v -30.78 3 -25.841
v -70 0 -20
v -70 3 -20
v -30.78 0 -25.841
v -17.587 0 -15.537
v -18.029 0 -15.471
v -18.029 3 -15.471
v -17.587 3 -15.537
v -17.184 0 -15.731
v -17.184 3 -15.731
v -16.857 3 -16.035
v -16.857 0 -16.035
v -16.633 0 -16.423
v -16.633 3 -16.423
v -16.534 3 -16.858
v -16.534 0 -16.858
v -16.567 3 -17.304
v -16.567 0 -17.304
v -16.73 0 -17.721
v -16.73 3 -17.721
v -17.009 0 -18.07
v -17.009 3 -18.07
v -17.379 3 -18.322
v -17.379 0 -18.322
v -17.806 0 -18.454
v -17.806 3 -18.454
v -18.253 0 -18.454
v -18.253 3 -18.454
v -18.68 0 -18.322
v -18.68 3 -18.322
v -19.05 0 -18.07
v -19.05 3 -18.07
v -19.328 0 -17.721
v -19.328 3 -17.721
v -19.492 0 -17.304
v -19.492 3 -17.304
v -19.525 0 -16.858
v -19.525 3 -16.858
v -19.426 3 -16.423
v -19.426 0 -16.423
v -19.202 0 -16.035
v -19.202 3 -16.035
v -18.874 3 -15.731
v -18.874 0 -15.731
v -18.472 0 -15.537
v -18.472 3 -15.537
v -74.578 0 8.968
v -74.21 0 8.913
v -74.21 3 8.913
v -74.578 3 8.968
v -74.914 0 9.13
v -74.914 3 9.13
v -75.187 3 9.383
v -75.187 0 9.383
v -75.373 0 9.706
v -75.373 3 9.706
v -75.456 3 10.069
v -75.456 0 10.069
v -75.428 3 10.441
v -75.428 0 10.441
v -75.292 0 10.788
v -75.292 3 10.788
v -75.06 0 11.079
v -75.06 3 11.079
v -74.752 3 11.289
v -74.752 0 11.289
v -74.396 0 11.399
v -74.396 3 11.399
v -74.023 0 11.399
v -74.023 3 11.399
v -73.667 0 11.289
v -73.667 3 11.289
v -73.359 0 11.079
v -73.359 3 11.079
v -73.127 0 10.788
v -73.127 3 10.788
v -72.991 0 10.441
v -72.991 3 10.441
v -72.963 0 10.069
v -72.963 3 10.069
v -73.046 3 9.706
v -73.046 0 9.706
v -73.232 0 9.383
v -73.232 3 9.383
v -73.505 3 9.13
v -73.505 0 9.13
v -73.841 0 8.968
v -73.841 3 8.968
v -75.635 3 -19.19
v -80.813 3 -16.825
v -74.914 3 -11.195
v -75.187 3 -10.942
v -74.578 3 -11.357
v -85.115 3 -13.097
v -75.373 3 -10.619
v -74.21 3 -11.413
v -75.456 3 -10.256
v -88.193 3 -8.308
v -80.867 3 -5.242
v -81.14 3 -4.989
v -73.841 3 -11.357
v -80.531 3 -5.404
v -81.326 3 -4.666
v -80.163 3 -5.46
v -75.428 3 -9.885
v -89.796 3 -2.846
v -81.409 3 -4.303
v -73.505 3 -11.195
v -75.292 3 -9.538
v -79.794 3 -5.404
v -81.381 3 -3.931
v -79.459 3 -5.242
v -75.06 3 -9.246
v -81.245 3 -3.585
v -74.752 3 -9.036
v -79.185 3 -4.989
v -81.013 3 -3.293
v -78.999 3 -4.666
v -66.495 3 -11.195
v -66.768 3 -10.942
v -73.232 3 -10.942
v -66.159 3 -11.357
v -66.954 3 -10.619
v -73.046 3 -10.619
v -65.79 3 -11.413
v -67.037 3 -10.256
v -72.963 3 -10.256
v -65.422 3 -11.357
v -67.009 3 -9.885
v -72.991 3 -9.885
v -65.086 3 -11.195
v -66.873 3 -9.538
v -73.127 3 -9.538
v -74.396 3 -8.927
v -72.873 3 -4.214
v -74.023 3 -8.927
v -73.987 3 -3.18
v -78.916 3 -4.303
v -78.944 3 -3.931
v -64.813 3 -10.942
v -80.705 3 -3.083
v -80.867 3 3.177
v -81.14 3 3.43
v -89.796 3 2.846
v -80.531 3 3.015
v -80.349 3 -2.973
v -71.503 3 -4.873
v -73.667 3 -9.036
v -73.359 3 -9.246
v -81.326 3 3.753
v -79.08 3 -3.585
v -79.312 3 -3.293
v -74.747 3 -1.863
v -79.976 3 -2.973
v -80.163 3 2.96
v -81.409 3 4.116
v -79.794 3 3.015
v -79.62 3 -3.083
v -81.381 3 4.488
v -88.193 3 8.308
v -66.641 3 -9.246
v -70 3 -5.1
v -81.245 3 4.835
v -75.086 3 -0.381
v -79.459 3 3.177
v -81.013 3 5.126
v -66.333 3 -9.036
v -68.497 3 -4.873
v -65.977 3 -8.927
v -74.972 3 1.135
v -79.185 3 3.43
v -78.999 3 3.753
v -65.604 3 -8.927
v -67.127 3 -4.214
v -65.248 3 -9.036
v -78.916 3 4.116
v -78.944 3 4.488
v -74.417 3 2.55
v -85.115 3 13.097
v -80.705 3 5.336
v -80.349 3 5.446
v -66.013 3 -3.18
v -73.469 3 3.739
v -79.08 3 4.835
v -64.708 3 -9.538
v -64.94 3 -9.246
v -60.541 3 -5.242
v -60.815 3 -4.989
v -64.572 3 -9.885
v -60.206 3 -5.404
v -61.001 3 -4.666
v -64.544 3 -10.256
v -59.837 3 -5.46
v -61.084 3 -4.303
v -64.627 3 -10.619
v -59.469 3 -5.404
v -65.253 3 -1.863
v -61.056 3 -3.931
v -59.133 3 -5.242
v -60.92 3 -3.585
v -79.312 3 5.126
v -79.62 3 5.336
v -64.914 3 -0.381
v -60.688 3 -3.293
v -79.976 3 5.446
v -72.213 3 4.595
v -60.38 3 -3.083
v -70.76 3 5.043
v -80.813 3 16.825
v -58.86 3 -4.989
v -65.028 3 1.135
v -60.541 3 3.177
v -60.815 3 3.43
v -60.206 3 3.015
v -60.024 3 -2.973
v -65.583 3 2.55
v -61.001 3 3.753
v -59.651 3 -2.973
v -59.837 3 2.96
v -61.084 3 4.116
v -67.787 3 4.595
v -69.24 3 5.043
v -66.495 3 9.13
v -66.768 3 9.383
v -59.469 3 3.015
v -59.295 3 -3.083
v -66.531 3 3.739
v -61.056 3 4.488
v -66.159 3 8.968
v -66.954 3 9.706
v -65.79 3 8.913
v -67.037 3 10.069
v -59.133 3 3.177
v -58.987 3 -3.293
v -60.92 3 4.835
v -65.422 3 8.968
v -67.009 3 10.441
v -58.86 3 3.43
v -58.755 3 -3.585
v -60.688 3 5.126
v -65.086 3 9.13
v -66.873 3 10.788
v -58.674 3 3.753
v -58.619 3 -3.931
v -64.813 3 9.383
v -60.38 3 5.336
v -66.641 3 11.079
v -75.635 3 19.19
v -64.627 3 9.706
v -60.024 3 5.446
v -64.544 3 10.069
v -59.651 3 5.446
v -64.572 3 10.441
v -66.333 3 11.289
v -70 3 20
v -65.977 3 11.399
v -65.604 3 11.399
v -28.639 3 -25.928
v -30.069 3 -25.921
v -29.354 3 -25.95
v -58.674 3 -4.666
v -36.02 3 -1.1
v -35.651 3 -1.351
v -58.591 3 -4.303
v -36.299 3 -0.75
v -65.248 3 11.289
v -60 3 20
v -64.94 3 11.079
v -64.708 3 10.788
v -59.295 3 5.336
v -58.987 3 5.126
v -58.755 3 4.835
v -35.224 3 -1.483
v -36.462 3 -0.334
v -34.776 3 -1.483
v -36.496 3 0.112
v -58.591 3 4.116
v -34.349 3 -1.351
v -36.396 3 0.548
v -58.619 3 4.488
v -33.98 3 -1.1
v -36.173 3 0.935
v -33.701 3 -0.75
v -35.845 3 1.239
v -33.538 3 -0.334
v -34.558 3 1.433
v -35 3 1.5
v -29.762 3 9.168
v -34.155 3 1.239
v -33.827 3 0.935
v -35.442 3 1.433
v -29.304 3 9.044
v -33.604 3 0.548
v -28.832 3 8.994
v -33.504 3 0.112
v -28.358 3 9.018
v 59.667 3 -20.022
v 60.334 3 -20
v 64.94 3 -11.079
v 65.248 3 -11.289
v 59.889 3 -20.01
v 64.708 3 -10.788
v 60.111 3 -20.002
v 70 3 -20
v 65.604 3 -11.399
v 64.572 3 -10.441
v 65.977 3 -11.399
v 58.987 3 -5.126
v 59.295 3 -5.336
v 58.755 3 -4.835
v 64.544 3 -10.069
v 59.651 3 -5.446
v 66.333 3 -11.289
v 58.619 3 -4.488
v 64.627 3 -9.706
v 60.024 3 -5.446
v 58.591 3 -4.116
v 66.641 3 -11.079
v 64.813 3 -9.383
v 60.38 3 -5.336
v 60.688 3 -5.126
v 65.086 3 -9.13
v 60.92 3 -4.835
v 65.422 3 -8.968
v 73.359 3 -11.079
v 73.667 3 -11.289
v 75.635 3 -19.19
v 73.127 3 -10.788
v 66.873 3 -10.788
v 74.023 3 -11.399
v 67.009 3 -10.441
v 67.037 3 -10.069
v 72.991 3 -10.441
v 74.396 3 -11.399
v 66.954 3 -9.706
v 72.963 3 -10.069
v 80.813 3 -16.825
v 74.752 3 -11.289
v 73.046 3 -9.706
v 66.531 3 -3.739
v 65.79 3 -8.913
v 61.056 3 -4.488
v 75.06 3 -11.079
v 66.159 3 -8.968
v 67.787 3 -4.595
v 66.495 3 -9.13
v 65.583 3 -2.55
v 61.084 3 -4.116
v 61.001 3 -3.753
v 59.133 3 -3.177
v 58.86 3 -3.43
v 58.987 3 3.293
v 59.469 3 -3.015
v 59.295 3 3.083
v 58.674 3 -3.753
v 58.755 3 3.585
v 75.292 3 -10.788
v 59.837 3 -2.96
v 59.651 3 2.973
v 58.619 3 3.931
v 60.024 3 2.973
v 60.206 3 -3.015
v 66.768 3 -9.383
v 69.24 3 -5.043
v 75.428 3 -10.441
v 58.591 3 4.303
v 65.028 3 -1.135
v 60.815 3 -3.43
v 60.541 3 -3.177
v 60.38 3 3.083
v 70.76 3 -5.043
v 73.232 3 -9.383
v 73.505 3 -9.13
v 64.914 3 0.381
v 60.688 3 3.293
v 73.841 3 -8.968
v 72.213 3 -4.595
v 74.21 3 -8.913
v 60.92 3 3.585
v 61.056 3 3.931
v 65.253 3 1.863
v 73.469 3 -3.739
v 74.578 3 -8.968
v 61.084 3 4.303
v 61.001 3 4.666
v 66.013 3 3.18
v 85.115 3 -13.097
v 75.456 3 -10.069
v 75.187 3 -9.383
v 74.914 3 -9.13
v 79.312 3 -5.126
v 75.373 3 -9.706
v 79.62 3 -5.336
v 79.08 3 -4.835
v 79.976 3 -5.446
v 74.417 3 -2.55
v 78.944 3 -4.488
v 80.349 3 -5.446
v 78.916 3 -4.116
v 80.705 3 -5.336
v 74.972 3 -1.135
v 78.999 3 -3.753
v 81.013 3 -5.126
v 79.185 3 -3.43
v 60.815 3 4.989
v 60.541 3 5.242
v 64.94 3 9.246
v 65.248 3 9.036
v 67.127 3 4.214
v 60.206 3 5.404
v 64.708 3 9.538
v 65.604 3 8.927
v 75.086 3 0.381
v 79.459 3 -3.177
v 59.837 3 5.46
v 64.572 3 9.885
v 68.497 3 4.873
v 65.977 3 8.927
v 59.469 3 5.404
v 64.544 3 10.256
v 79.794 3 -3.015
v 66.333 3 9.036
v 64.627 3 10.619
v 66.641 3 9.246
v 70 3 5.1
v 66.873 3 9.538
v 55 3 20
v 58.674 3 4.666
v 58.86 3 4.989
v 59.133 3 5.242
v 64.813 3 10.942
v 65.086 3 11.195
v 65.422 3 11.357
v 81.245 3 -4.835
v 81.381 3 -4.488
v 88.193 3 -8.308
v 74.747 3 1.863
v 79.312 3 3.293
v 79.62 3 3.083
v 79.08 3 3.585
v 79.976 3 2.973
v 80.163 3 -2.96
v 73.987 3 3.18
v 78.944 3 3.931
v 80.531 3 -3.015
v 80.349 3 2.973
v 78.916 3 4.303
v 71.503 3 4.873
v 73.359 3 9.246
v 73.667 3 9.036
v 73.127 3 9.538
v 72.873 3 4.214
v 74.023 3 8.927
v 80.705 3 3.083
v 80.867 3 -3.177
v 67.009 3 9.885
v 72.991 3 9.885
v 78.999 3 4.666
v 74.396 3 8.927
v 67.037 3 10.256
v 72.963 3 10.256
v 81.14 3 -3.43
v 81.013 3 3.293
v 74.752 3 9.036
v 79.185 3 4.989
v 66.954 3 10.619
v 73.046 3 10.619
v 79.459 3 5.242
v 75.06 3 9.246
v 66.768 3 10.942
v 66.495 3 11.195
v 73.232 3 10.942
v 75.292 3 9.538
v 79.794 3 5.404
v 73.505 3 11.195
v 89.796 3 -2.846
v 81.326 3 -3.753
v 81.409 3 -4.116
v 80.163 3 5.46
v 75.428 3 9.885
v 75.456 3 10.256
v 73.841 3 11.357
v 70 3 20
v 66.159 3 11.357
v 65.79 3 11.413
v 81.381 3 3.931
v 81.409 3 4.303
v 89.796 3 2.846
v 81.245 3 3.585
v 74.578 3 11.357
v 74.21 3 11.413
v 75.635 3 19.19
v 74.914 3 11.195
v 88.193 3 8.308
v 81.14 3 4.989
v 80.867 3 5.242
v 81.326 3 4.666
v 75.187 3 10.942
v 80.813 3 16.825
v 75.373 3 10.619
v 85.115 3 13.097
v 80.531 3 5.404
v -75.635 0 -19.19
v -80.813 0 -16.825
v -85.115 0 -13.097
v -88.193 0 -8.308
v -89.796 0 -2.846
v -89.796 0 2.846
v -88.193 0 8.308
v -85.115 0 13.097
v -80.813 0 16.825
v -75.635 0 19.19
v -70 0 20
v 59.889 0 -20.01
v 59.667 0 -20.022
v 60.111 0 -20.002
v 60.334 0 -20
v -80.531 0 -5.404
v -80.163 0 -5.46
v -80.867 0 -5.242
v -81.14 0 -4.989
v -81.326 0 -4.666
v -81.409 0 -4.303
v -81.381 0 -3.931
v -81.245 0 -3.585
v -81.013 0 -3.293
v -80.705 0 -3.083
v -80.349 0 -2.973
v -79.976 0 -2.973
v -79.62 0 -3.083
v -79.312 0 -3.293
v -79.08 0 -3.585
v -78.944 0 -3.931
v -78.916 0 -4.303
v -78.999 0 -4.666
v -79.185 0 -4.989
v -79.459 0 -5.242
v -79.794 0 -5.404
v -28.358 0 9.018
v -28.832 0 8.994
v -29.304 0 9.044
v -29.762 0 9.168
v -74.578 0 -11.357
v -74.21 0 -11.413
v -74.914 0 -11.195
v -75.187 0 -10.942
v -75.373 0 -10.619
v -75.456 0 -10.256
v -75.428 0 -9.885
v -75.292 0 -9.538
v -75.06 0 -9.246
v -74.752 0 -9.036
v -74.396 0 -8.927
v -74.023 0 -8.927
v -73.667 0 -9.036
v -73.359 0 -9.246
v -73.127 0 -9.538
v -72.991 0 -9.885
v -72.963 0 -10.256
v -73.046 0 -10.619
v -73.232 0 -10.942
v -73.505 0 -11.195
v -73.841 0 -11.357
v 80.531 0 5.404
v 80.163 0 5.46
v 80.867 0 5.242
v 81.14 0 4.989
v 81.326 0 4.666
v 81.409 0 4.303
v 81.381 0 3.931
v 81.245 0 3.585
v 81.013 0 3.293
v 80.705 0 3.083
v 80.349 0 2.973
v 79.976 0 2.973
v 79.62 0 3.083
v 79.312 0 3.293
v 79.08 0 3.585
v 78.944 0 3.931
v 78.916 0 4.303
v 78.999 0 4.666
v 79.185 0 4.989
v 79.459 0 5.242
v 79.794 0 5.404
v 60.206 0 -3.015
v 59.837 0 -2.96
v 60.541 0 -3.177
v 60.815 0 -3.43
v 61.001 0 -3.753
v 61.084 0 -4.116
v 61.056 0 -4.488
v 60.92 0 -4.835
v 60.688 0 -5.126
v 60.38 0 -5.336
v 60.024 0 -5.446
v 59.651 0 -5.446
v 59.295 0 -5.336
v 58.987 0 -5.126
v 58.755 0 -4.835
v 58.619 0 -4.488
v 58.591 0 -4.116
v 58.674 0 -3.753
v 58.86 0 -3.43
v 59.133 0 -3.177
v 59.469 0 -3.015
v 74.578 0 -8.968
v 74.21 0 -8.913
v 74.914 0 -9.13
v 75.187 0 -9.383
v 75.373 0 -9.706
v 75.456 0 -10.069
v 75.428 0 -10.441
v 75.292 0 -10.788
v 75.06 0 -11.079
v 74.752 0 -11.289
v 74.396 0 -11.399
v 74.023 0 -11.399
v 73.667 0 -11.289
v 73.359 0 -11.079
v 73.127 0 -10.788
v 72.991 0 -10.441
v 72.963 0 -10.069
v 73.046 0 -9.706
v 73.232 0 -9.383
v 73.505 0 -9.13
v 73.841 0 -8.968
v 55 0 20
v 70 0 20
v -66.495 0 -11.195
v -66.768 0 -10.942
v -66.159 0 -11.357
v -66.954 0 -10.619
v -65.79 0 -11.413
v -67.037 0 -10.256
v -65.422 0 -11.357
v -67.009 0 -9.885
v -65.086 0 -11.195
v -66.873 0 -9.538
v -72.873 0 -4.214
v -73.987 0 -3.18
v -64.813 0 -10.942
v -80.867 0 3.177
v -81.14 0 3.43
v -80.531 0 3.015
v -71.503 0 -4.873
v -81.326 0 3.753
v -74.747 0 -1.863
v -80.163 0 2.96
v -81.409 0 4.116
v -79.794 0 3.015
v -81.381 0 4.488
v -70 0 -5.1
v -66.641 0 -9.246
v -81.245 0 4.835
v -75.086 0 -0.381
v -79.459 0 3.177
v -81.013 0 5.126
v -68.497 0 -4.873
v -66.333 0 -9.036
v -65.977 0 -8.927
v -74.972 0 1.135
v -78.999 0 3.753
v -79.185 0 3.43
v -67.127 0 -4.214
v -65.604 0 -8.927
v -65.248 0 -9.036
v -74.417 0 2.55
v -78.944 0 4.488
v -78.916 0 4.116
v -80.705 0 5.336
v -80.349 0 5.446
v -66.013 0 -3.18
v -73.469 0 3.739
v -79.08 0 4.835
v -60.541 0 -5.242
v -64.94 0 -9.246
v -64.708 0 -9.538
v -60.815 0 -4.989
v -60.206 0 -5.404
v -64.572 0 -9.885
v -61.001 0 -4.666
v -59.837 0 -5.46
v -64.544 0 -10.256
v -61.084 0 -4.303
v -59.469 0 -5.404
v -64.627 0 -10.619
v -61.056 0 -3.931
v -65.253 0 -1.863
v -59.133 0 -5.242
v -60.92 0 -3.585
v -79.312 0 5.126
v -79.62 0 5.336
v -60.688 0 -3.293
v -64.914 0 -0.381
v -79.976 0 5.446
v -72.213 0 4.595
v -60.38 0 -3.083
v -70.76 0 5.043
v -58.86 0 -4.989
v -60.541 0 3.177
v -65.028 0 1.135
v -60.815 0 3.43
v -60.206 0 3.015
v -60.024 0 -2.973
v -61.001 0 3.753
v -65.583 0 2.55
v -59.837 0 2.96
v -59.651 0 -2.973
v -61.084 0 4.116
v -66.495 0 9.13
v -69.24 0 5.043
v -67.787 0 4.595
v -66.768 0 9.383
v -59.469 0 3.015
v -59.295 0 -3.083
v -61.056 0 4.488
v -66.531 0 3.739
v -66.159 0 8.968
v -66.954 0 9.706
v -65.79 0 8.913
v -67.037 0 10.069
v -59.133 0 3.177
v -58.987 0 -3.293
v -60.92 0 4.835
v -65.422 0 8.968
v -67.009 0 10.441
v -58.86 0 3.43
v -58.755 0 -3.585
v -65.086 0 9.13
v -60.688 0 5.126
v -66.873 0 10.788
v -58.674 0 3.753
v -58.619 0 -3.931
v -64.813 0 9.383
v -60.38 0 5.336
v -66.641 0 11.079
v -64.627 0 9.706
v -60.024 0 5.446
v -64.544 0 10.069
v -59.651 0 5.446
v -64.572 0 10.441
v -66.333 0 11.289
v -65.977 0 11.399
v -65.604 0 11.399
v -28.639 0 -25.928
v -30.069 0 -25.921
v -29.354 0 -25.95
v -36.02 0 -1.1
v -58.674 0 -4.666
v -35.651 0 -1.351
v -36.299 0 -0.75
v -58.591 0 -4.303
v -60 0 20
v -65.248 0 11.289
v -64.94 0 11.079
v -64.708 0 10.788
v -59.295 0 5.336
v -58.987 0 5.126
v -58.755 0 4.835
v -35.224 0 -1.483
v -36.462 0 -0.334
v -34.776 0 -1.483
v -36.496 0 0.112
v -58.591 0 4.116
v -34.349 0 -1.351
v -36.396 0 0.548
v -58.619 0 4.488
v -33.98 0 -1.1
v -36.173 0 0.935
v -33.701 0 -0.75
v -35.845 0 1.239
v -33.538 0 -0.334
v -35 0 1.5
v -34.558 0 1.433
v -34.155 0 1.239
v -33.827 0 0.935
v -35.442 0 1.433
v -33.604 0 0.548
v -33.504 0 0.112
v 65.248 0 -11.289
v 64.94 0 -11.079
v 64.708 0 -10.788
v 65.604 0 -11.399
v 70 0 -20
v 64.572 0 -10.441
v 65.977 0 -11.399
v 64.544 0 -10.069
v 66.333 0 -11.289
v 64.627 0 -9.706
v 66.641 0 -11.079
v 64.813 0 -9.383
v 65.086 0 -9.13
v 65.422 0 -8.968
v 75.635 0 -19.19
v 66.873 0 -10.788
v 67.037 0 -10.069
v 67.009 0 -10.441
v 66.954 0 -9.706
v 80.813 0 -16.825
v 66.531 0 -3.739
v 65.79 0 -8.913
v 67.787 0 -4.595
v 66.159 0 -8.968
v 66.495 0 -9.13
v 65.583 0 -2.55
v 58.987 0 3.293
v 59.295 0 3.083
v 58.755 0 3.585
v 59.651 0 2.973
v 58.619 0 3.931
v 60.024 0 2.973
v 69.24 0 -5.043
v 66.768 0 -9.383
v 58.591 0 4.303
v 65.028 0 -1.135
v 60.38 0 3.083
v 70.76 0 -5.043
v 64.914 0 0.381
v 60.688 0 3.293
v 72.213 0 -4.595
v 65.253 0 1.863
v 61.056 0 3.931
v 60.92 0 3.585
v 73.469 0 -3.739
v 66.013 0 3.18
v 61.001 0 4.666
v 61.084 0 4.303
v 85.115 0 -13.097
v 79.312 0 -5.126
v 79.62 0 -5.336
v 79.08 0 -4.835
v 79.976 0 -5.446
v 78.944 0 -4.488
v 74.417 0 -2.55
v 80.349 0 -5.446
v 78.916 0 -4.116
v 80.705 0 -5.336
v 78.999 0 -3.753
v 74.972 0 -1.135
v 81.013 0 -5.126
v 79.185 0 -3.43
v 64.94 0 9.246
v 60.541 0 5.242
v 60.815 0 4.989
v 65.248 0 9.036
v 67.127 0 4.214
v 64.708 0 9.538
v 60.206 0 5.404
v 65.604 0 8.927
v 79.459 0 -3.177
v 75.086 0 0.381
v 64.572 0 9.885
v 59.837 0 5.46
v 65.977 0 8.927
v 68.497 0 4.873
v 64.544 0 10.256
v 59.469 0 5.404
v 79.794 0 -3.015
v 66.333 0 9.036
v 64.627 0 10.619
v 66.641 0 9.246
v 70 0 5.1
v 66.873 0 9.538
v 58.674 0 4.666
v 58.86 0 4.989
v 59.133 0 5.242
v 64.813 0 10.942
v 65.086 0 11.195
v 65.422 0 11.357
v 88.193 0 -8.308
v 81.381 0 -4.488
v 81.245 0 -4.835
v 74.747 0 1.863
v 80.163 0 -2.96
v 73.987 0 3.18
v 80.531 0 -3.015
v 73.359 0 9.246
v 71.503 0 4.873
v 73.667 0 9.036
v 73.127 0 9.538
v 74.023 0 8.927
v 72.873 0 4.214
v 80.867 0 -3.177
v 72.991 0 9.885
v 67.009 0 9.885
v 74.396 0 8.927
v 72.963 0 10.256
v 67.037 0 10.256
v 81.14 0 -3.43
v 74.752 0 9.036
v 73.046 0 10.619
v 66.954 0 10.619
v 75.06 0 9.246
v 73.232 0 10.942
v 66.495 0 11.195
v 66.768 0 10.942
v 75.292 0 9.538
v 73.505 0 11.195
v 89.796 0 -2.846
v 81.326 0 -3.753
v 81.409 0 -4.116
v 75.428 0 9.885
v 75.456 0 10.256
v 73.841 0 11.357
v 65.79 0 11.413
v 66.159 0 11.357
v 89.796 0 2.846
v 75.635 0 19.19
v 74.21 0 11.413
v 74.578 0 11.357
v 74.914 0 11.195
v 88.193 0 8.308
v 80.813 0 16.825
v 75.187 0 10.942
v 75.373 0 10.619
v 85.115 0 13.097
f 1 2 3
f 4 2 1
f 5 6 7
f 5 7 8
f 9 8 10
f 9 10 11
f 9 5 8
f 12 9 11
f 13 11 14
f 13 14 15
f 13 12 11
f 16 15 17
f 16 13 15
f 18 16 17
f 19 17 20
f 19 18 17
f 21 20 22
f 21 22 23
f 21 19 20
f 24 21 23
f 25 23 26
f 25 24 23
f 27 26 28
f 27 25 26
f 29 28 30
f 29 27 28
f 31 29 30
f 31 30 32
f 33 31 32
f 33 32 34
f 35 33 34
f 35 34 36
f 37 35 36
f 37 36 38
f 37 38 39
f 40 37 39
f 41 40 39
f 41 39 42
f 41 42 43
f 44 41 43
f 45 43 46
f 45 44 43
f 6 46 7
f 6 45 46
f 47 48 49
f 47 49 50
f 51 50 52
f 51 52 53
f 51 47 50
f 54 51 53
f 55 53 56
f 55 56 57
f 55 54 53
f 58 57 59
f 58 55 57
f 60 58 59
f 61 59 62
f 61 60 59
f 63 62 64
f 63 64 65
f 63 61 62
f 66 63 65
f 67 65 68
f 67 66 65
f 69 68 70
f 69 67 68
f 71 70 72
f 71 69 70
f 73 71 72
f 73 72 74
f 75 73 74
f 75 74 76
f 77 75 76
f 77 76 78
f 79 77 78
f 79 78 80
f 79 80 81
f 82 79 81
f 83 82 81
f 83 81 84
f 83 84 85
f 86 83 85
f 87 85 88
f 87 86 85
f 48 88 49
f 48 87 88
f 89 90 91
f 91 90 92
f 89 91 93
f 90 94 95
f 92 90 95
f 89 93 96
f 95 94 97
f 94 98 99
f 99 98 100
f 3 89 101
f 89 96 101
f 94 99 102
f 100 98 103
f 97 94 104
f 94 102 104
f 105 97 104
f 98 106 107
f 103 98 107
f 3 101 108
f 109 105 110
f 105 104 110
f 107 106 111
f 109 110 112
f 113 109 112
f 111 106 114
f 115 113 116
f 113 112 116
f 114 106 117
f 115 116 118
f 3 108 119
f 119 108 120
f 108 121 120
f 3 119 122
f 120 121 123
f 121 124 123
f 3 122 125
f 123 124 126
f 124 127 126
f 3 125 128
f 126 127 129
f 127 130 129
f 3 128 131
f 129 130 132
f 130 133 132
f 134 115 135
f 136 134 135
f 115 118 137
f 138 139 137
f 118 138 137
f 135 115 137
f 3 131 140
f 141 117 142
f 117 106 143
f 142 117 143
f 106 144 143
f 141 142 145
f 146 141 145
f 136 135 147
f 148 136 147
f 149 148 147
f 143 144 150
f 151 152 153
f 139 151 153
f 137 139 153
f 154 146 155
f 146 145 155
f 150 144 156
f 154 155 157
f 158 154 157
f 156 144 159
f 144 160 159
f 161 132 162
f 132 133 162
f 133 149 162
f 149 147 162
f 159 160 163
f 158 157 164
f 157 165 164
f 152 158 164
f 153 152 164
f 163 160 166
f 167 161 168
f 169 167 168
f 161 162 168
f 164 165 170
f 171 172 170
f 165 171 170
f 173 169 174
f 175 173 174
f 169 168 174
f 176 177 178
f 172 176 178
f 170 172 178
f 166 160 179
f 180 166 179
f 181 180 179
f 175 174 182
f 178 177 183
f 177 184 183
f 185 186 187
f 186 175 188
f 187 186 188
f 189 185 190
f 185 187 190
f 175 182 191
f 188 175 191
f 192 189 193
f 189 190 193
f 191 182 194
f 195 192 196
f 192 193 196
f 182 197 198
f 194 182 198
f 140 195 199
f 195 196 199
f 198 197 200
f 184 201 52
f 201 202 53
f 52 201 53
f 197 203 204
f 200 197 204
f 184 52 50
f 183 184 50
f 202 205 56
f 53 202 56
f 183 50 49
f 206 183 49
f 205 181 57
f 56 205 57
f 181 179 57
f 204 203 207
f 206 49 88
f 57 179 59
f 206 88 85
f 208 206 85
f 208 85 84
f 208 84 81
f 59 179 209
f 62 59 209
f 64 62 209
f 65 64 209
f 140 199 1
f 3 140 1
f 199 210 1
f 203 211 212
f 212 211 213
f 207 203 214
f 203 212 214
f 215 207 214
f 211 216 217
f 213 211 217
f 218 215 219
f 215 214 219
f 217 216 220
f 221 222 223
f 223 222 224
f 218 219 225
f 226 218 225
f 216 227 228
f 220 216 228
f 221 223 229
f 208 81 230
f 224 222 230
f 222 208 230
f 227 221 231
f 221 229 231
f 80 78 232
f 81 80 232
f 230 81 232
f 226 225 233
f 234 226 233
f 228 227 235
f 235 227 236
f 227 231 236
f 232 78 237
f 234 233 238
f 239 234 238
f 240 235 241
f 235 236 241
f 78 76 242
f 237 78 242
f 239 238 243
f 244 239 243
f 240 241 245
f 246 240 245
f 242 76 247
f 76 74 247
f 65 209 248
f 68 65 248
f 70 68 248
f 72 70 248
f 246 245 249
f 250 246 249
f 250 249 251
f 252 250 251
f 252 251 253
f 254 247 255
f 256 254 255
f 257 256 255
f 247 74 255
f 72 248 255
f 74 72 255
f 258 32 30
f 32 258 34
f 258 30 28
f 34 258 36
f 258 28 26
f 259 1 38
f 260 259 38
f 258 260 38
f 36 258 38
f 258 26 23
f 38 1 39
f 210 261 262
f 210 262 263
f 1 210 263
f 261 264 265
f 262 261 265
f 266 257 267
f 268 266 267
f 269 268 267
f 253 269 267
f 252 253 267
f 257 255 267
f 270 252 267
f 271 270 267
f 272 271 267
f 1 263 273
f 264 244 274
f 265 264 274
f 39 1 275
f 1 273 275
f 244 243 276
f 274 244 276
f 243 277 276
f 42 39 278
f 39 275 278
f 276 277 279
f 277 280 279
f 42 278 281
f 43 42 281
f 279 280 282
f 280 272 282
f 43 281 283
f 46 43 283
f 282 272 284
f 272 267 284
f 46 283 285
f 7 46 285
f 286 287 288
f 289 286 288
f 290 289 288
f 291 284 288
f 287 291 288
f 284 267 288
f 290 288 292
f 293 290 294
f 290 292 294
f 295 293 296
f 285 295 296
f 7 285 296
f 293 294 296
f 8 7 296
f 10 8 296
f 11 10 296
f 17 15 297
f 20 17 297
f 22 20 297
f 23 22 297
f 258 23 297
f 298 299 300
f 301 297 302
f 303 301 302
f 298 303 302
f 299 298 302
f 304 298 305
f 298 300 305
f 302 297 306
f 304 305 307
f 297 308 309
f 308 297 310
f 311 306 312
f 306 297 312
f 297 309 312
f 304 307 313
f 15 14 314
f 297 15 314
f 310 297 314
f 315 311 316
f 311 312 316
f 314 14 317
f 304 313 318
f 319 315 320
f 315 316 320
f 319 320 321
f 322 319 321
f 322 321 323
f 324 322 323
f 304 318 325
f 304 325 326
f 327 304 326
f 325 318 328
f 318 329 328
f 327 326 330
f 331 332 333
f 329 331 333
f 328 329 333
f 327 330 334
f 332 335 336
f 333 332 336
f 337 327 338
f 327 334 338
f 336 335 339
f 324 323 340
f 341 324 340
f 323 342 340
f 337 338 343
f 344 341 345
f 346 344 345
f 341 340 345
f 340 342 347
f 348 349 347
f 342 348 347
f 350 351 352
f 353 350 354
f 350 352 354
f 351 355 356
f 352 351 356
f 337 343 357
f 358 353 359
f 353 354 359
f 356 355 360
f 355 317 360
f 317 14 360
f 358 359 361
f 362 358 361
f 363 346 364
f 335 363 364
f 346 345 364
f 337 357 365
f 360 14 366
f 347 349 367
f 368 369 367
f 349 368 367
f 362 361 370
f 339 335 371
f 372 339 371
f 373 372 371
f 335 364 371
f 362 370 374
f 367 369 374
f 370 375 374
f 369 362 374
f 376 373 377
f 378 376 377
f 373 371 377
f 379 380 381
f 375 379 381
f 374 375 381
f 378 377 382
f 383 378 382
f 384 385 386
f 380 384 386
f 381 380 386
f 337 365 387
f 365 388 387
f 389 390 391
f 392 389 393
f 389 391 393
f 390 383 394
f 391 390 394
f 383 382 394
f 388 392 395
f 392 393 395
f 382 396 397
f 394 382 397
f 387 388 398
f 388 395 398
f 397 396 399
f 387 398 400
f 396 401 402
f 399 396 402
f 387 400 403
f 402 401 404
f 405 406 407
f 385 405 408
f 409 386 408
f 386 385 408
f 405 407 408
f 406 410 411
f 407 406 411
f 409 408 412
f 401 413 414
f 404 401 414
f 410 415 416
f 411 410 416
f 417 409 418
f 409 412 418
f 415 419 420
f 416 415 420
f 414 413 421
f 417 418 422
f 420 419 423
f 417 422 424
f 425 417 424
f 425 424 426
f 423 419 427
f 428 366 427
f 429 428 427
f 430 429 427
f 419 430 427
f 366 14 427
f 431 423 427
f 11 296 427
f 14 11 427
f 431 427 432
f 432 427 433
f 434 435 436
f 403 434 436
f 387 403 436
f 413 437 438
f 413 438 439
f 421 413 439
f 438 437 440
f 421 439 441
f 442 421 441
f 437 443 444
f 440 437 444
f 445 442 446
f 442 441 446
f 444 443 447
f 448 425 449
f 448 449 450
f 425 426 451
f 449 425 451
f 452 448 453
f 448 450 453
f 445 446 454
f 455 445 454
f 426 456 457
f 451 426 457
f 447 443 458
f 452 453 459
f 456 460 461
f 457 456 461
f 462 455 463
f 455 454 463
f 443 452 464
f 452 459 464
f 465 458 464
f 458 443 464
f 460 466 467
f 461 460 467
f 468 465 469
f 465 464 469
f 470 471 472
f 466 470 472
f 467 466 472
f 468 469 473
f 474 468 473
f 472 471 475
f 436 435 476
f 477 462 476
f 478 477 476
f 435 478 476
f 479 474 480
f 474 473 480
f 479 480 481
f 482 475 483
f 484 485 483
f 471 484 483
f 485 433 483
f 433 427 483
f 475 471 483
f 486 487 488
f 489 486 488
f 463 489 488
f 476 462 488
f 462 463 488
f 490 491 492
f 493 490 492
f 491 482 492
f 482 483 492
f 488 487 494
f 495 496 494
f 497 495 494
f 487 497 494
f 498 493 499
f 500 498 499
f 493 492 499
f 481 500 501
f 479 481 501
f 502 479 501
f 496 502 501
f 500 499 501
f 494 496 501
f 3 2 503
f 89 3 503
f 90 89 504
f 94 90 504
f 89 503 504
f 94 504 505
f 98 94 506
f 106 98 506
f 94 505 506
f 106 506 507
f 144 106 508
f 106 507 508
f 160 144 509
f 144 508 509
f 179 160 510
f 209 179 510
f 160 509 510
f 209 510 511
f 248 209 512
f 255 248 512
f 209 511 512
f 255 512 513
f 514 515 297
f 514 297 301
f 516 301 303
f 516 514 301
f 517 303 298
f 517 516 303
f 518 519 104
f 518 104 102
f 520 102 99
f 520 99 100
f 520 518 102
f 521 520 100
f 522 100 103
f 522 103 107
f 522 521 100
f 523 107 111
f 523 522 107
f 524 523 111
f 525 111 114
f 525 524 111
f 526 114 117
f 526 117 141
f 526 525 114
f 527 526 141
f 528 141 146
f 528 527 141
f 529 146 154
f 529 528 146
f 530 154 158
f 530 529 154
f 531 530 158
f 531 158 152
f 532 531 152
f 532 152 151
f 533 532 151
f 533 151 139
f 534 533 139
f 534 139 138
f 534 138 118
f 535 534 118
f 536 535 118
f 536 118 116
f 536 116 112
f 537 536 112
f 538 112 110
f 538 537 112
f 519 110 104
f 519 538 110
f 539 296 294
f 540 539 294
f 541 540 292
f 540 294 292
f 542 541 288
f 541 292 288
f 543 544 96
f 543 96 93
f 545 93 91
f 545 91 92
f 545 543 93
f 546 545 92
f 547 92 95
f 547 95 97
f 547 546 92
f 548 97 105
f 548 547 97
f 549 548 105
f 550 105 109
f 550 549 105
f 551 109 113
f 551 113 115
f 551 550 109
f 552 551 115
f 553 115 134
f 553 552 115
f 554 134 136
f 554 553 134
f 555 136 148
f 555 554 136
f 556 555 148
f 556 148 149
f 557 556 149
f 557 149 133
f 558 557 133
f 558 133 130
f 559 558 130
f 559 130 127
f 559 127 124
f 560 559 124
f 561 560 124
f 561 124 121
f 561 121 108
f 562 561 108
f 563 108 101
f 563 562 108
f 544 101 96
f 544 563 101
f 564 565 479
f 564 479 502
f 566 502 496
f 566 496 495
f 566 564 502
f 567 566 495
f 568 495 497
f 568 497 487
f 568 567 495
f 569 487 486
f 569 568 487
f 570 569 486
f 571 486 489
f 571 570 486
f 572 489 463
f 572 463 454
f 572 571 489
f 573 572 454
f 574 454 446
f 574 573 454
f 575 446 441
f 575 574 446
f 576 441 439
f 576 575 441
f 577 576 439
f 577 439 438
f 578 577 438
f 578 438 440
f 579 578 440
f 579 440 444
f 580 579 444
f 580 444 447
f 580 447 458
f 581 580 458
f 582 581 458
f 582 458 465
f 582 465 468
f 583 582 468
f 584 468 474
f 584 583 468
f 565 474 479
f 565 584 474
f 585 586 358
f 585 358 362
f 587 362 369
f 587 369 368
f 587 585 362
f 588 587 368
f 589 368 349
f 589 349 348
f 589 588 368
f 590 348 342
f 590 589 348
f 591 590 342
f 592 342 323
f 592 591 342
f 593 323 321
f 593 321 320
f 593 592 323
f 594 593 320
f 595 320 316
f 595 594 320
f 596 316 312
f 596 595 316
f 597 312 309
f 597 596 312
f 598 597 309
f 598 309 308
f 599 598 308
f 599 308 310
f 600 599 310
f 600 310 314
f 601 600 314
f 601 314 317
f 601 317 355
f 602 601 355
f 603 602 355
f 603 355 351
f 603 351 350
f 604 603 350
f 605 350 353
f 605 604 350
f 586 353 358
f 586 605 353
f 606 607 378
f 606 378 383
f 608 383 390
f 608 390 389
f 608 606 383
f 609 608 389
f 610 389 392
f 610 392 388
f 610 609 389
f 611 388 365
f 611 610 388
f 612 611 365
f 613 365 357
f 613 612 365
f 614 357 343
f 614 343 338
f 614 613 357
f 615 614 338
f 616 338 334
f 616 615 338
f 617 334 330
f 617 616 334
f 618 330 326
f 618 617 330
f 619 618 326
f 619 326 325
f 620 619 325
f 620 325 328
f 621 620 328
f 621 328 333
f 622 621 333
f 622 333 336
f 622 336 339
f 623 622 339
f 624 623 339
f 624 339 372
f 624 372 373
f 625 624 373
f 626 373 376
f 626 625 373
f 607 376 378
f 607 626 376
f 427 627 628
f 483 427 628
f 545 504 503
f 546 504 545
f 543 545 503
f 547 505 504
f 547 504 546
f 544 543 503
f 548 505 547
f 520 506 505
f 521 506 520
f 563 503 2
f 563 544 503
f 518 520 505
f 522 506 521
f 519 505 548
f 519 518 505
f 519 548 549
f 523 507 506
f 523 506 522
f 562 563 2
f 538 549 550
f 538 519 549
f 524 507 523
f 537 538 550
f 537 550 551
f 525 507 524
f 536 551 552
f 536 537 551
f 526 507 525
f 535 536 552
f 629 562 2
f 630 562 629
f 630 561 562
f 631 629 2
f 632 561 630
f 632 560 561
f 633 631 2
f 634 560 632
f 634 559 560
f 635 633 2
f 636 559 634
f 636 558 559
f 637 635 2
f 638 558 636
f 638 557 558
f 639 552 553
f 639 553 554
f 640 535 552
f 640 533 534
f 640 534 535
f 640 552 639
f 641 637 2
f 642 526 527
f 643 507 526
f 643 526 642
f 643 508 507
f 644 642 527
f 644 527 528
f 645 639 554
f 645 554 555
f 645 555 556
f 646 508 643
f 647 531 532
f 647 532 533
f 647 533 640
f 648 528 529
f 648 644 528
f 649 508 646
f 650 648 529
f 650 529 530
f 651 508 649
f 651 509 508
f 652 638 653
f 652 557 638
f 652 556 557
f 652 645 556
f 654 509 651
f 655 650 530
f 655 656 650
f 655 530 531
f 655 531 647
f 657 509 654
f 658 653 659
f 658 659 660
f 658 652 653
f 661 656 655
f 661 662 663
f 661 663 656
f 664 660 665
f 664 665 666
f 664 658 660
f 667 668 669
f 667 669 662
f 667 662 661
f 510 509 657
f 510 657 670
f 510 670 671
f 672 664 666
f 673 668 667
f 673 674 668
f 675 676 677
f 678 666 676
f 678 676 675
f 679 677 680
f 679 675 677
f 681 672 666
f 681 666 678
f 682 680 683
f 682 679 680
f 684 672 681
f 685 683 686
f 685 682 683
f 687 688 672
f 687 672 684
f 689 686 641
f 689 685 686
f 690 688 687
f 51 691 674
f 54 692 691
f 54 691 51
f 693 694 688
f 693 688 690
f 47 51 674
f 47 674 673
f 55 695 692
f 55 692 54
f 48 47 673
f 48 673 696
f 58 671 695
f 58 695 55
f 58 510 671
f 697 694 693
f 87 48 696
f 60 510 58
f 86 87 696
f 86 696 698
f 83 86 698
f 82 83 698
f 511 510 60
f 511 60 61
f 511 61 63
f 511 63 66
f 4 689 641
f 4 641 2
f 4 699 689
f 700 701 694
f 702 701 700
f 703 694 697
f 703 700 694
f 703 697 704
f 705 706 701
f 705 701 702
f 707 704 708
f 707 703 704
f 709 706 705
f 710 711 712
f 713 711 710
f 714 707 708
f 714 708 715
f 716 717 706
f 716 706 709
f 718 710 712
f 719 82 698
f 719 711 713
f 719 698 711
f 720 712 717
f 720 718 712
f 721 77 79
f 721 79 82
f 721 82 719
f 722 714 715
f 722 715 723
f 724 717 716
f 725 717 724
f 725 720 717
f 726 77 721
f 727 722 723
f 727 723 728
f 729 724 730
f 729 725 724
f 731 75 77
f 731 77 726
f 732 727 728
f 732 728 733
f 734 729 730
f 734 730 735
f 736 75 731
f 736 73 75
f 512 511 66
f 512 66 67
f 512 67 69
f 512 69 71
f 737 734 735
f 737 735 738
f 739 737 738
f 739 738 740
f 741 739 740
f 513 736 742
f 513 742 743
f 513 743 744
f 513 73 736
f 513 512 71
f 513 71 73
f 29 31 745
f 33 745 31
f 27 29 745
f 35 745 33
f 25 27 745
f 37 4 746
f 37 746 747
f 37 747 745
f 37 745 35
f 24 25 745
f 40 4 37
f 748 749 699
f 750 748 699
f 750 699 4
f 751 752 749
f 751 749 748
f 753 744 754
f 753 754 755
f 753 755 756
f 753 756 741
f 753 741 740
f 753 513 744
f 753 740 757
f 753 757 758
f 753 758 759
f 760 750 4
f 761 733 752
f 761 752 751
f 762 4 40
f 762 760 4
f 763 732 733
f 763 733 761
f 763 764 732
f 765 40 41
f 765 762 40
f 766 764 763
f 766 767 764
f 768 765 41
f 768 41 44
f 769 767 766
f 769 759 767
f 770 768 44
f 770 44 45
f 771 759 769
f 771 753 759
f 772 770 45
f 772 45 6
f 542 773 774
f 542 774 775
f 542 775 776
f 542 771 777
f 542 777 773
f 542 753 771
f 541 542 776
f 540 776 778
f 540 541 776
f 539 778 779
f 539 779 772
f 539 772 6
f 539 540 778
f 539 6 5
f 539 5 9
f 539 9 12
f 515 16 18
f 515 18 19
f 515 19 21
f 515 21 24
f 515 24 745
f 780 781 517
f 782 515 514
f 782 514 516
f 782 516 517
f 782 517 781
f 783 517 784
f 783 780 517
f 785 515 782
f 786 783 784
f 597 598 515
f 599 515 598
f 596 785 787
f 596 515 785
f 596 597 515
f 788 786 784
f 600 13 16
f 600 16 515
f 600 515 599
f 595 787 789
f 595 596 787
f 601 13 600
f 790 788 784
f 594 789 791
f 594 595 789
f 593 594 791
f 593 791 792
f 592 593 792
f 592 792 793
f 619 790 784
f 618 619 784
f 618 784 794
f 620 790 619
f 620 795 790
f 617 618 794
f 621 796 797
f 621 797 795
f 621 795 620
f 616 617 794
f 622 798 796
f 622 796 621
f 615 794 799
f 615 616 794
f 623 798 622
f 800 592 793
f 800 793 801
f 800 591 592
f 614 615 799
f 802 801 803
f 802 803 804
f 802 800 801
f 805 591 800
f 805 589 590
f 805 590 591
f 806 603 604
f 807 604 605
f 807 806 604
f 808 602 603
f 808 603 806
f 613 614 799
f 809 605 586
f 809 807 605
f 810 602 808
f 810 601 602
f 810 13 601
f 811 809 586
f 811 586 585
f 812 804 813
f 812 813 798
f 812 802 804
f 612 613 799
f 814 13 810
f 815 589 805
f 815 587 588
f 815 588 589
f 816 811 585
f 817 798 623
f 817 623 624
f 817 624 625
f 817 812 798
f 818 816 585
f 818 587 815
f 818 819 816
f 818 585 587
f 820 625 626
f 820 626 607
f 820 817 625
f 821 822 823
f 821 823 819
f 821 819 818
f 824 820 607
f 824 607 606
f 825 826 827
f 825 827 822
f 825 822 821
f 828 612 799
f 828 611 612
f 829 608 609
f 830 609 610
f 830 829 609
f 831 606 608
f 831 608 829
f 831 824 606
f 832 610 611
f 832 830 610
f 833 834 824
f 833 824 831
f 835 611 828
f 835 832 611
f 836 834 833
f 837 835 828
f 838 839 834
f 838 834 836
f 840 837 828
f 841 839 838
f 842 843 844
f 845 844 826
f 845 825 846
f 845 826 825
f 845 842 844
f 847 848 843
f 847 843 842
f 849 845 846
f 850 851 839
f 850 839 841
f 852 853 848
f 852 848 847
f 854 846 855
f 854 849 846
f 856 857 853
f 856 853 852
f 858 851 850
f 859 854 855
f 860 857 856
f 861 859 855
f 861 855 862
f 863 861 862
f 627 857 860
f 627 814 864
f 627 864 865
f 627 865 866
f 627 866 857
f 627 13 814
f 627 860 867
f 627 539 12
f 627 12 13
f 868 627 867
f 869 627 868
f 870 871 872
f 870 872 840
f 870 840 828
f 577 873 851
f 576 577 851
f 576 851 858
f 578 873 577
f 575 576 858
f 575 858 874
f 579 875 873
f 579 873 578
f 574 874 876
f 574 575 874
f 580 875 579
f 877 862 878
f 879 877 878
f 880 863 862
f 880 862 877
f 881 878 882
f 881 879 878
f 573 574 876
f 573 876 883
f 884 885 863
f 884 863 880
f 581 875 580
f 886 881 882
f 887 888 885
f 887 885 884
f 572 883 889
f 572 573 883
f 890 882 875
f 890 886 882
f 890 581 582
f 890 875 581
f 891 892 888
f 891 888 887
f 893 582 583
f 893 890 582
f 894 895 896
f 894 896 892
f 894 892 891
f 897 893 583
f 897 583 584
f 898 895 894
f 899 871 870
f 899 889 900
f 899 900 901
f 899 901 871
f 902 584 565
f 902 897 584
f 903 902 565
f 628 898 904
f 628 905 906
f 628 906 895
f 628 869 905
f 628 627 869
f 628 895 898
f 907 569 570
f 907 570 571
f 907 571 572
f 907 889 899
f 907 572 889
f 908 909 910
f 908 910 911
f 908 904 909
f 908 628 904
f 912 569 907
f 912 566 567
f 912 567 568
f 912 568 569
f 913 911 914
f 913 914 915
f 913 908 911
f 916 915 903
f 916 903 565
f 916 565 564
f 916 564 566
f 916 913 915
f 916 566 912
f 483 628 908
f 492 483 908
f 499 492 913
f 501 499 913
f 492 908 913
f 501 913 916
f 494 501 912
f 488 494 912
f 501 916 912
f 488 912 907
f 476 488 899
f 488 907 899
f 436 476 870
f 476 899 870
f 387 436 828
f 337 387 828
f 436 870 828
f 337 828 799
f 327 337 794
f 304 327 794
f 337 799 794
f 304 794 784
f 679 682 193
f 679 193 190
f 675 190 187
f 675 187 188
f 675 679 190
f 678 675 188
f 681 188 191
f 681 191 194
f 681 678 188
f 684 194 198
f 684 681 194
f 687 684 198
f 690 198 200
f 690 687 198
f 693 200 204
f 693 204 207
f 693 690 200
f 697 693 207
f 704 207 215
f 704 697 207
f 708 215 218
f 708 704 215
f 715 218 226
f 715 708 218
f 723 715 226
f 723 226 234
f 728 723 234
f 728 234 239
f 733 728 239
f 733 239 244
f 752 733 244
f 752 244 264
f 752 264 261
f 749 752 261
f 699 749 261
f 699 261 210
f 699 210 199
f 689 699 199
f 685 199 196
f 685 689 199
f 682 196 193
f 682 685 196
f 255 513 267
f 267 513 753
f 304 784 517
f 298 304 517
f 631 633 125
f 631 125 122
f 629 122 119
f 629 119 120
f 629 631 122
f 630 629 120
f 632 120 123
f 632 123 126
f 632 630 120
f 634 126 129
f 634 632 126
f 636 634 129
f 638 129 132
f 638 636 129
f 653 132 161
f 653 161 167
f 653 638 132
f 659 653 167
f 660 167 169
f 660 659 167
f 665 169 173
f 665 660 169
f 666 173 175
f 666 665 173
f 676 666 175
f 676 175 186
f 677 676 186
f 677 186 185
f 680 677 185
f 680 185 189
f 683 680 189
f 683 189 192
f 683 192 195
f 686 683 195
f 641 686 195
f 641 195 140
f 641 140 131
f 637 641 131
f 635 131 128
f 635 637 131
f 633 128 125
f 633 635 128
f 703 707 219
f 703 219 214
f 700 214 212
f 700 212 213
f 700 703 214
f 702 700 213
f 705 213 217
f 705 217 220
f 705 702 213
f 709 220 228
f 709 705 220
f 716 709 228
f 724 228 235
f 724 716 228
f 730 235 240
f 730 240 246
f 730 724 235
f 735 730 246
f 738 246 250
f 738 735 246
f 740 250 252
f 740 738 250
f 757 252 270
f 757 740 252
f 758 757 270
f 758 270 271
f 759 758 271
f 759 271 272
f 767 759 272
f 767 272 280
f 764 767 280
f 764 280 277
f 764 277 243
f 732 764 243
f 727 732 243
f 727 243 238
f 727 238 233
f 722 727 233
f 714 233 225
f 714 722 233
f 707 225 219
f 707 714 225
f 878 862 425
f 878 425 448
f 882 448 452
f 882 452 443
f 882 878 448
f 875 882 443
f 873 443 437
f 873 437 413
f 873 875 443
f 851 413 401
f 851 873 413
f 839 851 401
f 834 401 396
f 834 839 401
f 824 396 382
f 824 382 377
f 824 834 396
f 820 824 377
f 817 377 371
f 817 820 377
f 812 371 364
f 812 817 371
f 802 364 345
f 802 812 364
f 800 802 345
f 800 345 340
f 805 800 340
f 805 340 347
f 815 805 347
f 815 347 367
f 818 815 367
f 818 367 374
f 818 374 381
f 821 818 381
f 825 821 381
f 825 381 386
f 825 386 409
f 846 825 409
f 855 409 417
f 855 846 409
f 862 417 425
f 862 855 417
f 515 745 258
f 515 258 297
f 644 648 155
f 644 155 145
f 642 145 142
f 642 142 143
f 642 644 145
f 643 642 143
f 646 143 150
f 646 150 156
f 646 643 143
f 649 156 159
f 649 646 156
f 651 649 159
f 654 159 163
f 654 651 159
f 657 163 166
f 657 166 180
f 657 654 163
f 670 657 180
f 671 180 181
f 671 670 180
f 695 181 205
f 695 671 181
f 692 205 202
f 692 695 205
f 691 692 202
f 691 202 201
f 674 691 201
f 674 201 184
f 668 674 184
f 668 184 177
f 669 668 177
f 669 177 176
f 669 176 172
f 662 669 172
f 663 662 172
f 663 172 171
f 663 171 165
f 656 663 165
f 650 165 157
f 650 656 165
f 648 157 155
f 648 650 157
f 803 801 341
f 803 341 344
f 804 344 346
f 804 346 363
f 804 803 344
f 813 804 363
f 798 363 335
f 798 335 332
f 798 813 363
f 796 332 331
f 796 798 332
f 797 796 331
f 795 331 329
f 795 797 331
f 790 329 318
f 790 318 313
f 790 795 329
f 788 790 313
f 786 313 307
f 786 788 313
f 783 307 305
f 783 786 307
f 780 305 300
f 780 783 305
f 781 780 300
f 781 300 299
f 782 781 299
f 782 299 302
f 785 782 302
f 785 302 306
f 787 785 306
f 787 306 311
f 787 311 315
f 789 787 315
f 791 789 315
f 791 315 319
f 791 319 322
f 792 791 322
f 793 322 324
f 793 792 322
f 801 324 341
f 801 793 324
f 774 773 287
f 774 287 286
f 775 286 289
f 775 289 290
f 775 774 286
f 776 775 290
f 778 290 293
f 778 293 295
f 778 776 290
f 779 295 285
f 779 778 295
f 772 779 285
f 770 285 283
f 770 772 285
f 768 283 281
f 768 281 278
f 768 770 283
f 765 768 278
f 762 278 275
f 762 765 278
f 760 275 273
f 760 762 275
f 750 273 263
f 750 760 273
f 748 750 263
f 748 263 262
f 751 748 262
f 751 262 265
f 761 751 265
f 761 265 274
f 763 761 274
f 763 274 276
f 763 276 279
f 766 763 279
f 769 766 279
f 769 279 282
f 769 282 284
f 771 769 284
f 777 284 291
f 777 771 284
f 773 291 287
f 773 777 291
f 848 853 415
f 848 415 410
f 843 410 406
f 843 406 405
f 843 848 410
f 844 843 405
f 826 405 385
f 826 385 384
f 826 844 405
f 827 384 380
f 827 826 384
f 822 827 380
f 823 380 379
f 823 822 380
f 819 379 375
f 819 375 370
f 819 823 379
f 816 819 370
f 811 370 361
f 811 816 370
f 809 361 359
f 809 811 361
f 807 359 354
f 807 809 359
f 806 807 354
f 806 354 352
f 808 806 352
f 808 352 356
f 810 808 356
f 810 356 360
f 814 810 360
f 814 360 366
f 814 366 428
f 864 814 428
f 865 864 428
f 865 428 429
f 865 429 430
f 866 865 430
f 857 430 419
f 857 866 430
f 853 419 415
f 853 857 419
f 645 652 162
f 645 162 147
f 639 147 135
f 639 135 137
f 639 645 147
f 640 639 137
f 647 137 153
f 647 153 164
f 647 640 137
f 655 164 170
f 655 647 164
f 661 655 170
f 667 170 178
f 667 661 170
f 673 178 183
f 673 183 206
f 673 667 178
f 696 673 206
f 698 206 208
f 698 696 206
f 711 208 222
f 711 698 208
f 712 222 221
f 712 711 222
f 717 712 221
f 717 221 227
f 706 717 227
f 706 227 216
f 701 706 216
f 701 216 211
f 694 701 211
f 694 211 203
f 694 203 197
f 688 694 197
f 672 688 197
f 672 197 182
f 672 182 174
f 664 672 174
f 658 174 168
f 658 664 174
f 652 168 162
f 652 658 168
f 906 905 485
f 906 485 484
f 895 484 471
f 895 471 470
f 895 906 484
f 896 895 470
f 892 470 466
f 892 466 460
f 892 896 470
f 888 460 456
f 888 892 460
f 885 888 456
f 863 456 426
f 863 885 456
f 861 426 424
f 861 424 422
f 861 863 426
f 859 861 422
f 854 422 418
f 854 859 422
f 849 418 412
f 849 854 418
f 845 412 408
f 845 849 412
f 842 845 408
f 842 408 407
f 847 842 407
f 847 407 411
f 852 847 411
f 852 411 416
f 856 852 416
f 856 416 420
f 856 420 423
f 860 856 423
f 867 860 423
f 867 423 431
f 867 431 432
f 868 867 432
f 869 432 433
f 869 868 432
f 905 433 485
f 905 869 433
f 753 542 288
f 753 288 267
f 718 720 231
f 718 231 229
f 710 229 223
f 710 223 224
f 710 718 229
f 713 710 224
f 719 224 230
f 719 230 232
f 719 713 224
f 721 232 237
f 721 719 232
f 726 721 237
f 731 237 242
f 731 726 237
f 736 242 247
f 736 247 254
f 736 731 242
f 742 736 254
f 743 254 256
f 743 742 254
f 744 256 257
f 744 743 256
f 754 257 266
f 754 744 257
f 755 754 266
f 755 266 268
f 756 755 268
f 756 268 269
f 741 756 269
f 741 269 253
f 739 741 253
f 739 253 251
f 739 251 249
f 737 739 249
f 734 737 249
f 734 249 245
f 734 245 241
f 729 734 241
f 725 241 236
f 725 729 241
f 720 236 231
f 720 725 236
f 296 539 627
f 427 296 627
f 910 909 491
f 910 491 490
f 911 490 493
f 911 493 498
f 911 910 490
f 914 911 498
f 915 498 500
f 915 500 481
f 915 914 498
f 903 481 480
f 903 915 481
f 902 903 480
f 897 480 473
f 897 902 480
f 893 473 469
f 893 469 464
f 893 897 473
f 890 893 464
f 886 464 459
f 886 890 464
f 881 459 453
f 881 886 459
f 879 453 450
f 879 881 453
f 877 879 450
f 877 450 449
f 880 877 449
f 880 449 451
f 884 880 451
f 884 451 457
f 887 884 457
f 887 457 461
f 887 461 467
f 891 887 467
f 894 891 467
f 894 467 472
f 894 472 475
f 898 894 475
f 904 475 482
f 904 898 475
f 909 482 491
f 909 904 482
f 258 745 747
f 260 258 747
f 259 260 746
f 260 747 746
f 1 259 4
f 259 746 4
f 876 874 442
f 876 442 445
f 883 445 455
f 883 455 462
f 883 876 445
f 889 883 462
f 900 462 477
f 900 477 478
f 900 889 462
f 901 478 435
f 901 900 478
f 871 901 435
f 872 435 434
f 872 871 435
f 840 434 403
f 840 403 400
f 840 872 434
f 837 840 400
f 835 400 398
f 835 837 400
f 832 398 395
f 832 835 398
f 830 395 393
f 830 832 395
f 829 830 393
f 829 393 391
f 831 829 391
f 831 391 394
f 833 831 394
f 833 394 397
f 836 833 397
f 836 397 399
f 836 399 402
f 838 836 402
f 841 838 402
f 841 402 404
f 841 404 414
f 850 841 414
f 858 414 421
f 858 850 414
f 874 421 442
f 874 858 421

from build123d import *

# Parameters (mm, degrees)
SKETCH1_R           = 5.1
SKETCH1_R_2         = 1.25
SKETCH1_R_3         = 1.5
BOSS_EXTRUDE1_DEPTH = 3
FILLET1_R           = 3
CUT_EXTRUDE1_DEPTH  = 10
BOSS_EXTRUDE2_DEPTH = 3
CUT_EXTRUDE2_DEPTH  = 10
FILLET2_R           = 10


with BuildPart() as part:
    # Sketch1 → Boss-Extrude1 (new body)
    with BuildSketch(Plane(origin=(0, 0, 0), x_dir=(1, 0, 0), z_dir=(0, 1, 0))):
        with BuildLine():
            Line((70, 20), (-70, 20))
            ThreePointArc((-70, 20), (-90, 0), (-70, -20))
            Line((-70, -20), (-41, -20))
            Line((-41, -20), (-28.75, -7.75))
            Line((-28.75, -7.75), (-16.5, -20))
            Line((-16.5, -20), (70, -20))
            ThreePointArc((70, -20), (90, 0), (70, 20))
        make_face()
        with Locations(Location((70, 0, 0), (0, 0, 270))):
            Circle(SKETCH1_R, mode=Mode.SUBTRACT)
        with Locations(Location((59.837325142, 4.209517756, 0), (0, 0, 270))):
            Circle(SKETCH1_R_2, mode=Mode.SUBTRACT)
        with Locations(Location((65.790482244, 10.162674858, 0), (0, 0, 270))):
            Circle(SKETCH1_R_2, mode=Mode.SUBTRACT)
        with Locations(Location((74.209517756, 10.162674858, 0), (0, 0, 270))):
            Circle(SKETCH1_R_2, mode=Mode.SUBTRACT)
        with Locations(Location((80.162674858, 4.209517756, 0), (0, 0, 270))):
            Circle(SKETCH1_R_2, mode=Mode.SUBTRACT)
        with Locations(Location((80.162674858, -4.209517756, 0), (0, 0, 270))):
            Circle(SKETCH1_R_2, mode=Mode.SUBTRACT)
        with Locations(Location((74.209517756, -10.162674858, 0), (0, 0, 270))):
            Circle(SKETCH1_R_2, mode=Mode.SUBTRACT)
        with Locations(Location((65.790482244, -10.162674858, 0), (0, 0, 270))):
            Circle(SKETCH1_R_2, mode=Mode.SUBTRACT)
        with Locations(Location((59.837325142, -4.209517756, 0), (0, 0, 270))):
            Circle(SKETCH1_R_2, mode=Mode.SUBTRACT)
        with Locations(Location((-59.837325142, -4.209517756, 0), (0, 0, 90))):
            Circle(SKETCH1_R_2, mode=Mode.SUBTRACT)
        with Locations(Location((-65.790482244, -10.162674858, 0), (0, 0, 90))):
            Circle(SKETCH1_R_2, mode=Mode.SUBTRACT)
        with Locations(Location((-74.209517756, -10.162674858, 0), (0, 0, 90))):
            Circle(SKETCH1_R_2, mode=Mode.SUBTRACT)
        with Locations(Location((-80.162674858, -4.209517756, 0), (0, 0, 90))):
            Circle(SKETCH1_R_2, mode=Mode.SUBTRACT)
        with Locations(Location((-80.162674858, 4.209517756, 0), (0, 0, 90))):
            Circle(SKETCH1_R_2, mode=Mode.SUBTRACT)
        with Locations(Location((-74.209517756, 10.162674858, 0), (0, 0, 90))):
            Circle(SKETCH1_R_2, mode=Mode.SUBTRACT)
        with Locations(Location((-65.790482244, 10.162674858, 0), (0, 0, 90))):
            Circle(SKETCH1_R_2, mode=Mode.SUBTRACT)
        with Locations(Location((-59.837325142, 4.209517756, 0), (0, 0, 90))):
            Circle(SKETCH1_R_2, mode=Mode.SUBTRACT)
        with Locations(Location((-70, 0, 0), (0, 0, 90))):
            Circle(SKETCH1_R, mode=Mode.SUBTRACT)
        with Locations(Location((-35, 0, 0), (0, 0, 270))):
            Circle(SKETCH1_R_3, mode=Mode.SUBTRACT)
        with Locations(Location((-18.029437252, 16.970562748, 0), (0, 0, 270))):
            Circle(SKETCH1_R_3, mode=Mode.SUBTRACT)
    extrude(amount=BOSS_EXTRUDE1_DEPTH)

    # Fillet1
    fillet1_edges = [part.edges().sort_by_distance(p)[0] for p in [
        (-16.5, 1.5, 20),
        (-28.75, 1.5, 7.75),
        (-41, 1.5, 20),
    ]]
    fillet(fillet1_edges, radius=FILLET1_R)

    # Sketch2 → Cut-Extrude1 (cut)
    with BuildSketch(Plane.XZ):
        Polygon((-28.358163655, 9.01834005), (55, 20), (-28.358163655, 26.558419641), align=None)
    extrude(amount=-CUT_EXTRUDE1_DEPTH, mode=Mode.SUBTRACT)

    # Sketch3 → Boss-Extrude2 (add)
    with BuildSketch(Plane.XZ):
        Polygon((-70, -20), (-29.714195297, -26), (60, -20), align=None)
    extrude(amount=-BOSS_EXTRUDE2_DEPTH)

    # Sketch4 → Cut-Extrude2 (cut)
    with BuildSketch(Plane.XZ):
        Polygon((-29.761678485, 9.168369694), (-60, 20), (-60.52961588, 25.578691215), (-29.998372271, 24.401767037), align=None)
    extrude(amount=-CUT_EXTRUDE2_DEPTH, mode=Mode.SUBTRACT)

    # Fillet2
    # the kernel refuses this fillet: 10 mm, written as the material it adds along each edge
    with BuildSketch(Plane(origin=(60, 0, -20), x_dir=(-0.9977710708464071, 0, -0.06672997963445026), z_dir=(0, 1, 0))) as fillet2_piece_1:
        with BuildLine():
            CenterArc((FILLET2_R * 0.0334022154031, -FILLET2_R), FILLET2_R, 90, 3.826189391)
            Line((-FILLET2_R * 0.0333277642314, -FILLET2_R * 0.00222892915359), (0, 0))
            Line((0, 0), (FILLET2_R * 0.0334022154031, 0))
        make_face()
    extrude(amount=3)
    # the kernel refuses this fillet: 10 mm, written as the material it takes off along each edge
    with BuildSketch(Plane(origin=(-29.714195297, -2.693204599, -26), x_dir=(-0.9890902260552777, 0, 0.14731097963804135), z_dir=(0, 1, 0))) as fillet2_2_piece_1:
        with BuildLine():
            CenterArc((FILLET2_R * 0.107728183948, FILLET2_R), FILLET2_R, 257.702684713, 12.297315287)
            Line((-FILLET2_R * 0.105256420594, FILLET2_R * 0.0229444446563), (0, 0))
            Line((0, 0), (FILLET2_R * 0.107728183948, 0))
        make_face()
    extrude(amount=8.386409197, mode=Mode.SUBTRACT)


solid = part.part
